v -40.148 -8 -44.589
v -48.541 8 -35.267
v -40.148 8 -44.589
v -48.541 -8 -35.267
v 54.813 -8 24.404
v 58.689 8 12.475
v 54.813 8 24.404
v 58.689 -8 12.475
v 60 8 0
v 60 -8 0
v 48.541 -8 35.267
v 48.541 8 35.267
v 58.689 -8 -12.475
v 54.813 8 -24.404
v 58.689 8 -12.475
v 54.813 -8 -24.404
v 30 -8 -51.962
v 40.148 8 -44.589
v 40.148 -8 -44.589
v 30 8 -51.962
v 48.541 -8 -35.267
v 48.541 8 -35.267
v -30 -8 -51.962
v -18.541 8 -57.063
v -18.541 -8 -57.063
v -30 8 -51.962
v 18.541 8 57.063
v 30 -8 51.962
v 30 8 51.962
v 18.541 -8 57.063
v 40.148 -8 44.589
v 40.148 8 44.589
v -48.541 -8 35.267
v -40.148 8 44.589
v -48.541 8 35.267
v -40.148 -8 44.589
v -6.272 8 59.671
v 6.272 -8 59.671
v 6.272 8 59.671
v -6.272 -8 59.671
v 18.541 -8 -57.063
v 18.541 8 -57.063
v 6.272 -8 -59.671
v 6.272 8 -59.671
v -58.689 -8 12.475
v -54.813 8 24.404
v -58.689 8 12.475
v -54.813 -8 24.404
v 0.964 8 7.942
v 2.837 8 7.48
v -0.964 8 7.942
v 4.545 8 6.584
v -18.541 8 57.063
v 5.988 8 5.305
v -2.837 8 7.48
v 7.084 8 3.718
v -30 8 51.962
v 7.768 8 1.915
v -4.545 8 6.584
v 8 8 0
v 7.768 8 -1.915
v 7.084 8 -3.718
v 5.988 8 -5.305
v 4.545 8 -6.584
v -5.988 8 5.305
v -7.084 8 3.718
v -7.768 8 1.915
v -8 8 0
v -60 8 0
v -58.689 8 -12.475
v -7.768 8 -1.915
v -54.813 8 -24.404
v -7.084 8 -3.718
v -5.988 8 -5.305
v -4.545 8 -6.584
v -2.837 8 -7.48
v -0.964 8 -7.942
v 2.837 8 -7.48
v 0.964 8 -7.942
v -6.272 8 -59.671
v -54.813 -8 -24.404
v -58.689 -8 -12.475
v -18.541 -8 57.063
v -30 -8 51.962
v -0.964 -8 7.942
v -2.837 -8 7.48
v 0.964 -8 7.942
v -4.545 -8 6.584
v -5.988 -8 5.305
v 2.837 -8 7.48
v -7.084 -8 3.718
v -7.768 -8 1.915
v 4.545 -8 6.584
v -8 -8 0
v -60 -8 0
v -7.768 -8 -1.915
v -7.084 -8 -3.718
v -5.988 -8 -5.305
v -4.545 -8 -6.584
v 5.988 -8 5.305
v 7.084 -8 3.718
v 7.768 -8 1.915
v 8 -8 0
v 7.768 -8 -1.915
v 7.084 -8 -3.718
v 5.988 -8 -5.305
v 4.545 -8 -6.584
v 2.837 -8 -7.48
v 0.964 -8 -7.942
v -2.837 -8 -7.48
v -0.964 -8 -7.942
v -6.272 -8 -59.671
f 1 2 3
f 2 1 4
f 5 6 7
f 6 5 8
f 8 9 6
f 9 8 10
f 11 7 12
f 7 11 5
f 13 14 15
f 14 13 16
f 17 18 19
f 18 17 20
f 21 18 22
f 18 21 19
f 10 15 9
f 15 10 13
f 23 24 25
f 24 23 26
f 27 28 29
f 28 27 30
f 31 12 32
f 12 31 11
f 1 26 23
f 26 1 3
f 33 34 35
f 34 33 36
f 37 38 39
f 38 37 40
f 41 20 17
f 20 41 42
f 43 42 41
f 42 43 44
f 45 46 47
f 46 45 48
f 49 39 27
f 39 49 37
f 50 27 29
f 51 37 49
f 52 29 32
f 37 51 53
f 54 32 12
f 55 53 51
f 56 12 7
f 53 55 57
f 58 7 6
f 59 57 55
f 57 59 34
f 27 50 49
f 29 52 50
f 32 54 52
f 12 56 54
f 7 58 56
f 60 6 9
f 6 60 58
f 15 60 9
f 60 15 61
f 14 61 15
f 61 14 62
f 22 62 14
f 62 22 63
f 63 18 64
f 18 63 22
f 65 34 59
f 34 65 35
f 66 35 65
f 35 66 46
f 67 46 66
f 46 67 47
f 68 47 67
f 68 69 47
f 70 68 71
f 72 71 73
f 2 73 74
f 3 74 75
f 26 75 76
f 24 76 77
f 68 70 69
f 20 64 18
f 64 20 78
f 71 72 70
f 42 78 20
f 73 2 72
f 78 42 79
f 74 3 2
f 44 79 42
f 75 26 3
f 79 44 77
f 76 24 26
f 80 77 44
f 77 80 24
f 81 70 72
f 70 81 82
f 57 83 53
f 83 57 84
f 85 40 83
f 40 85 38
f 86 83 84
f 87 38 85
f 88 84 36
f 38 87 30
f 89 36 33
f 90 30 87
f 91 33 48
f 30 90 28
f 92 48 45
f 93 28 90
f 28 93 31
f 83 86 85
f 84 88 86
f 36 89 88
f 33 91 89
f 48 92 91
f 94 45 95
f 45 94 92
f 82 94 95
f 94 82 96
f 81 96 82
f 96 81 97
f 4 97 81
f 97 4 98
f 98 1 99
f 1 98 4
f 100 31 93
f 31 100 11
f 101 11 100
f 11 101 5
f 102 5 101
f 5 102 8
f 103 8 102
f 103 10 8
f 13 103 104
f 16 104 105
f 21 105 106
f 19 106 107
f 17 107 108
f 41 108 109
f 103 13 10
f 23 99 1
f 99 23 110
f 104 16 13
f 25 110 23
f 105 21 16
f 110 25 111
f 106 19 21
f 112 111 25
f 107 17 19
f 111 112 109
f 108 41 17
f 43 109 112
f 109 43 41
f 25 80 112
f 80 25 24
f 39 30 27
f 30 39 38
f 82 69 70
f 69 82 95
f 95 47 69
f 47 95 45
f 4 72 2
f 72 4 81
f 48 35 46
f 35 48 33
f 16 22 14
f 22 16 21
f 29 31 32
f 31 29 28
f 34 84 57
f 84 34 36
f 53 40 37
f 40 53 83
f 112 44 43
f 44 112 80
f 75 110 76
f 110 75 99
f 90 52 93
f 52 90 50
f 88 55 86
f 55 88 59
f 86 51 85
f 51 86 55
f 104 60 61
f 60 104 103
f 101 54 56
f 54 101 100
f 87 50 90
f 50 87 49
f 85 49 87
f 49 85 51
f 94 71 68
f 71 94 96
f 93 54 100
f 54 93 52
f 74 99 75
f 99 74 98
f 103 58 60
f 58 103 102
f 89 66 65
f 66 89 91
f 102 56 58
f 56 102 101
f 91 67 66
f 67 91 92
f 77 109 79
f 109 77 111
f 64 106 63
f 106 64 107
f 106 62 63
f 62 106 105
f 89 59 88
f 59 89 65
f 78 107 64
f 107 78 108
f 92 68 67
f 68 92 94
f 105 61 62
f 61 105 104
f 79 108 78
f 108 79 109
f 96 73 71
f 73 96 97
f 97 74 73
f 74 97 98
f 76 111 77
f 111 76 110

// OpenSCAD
// file: ../fixings/tube_clamp_square_base_plate_132_functions.scad
function get_L_shaft_with_base_plate_square_base_plate_132(beam_width) = 
    // (beam_width == 40) ?
    75
;
function get_R_plate_square_base_plate_132(beam_width) = 
    // (beam_width == 40) ?
    [143, 75, 18.5]
;
function get_thickness_square_base_plate_132(beam_width) = 
    // (beam_width == 40) ?
    8
;
function get_offset_hole_x_square_base_plate_132(beam_width) = 
    // (beam_width == 40) ?
    100 / 2
;
function get_diameter_hole_square_base_plate_132(beam_width) = 
    // (beam_width == 40) ?
    10
;
// file: ../fixings/tube_clamp_round_base_plate_132_functions.scad
function get_L_shaft_with_base_plate_round_base_plate_132(tube_diameter) = 
    (tube_diameter == 27) ? 
        85
    : (tube_diameter == 42) ?
        122
    : 25
;
function get_R_plate_round_base_plate_132(tube_diameter) = 
    (tube_diameter == 27) ? 
        [64, 114, 7]
    : (tube_diameter == 42) ?
        [80, 140, 10]
    : [10, 20, 1]
;
function get_offset_hole_y_round_base_plate_132(tube_diameter) = 
    (tube_diameter == 27) ? 
        38
    : (tube_diameter == 42) ?
        50
    : 10
;
function get_diameter_hole_round_base_plate_132(tube_diameter) = 10;
// file: ../fixings/tube_clamp_round_3_way_through_116_functions.scad
function  get_L_shaft_long_round_3_way_through_116(tube_diameter) = 
    (tube_diameter == 27) ? 
        42
    : (tube_diameter == 42) ?
        60
    : 25
;
function get_thickness_round_3_way_through_116(tube_diameter) = 7;
function get_L_shaft_short_round_3_way_through_116(tube_diameter) = tube_diameter + 2 * get_thickness_round_3_way_through_116();
// file: ../fixings/tube_clamp_round_tee_long_104_functions.scad
// include <../../config.scad>;

function get_L_shaft_long_round_tee_long_104(tube_diameter) = 
    (tube_diameter == 27) ? 
        85
    : (tube_diameter == 42) ?
        122
    : 25
;
function get_L_shaft_short_round_tee_long_104(tube_diameter) = 
    (tube_diameter == 27) ? 
        42
    : (tube_diameter == 42) ?
        61
    : 10
;
// file: brake_assembly_functions.scad
// include <../../config.scad>; // circular reference!

function get_y_pos_lead_fixing_ballscrew_to_brake_arms(angle_brake_rod, y_pos_axle_rear, x_pos_axle_leg_rear, x_offset_fixing_brake_arm_to_lead_plate) = y_pos_axle_rear + (x_pos_axle_leg_rear - x_offset_fixing_brake_arm_to_lead_plate) / tan(angle_brake_rod); // (X_POS_AXLE_LEG_REAR - X_OFFSET_FIXING_BRAKE_ARM_TO_LEAD_PLATE)
// file: ../common/washer.scad
include <../../config.scad>;

module washer(t, d_outer, d_inner, centre = true) {
    r_outer = d_outer / 2;
    r_inner = d_inner / 2;
    color("silver") difference() {
        cylinder(t, r_outer, r_outer, center = centre);
        cylinder(t, r_inner, r_inner, center = centre);
    }
    // Shopping
    echo(str("Washer: Washer Φ", d_outer, "mm x ", d_inner, "mm x ", t, "mm - x1"));
}

// $fn = 200;
washer(3, 10, 40);
// file: ../common/metric_bolt_functions.scad
function get_metric_bolt_head_height(size) = size;
function get_metric_bolt_head_diameter(size) = size * 2;
function get_metric_bolt_washer_diameter_safe_working_clearance(size) = 
    (size < 20) ?
        4 * size
    :
        3 * size
;
// file: ../common/metric_nut.scad
// include <../../config.scad>;
use <./beam_hexagonal.scad>;
use <./metric_bolt_functions.scad>;

module metric_nut(size, centre = true) {
    height = get_metric_bolt_head_height(size);
    diameter = get_metric_bolt_head_diameter(size);
    radius = diameter / 2;
    color("gray") difference() {
        // body
        beam_hexagonal(height, diameter, centre = centre, suppress_shopping_outputs = true);
        // hole
        cylinder(height, size / 2, size / 2, center = centre);
    }
    // Shopping
    echo(str("Nut: Nut M", size, " - x1"));
}

// $fn = 200;
metric_nut(12);
// file: ../common/beam_hexagonal.scad
// include <../../config.scad>;

module beam_hexagonal(L, d, centre = true, suppress_shopping_outputs = false) {
    radius = d / 2;
    linear_extrude(L, center = centre) polygon([[radius, 0], [radius * cos(60), radius * sin(60)], [radius * cos(120), radius * sin(120)], [radius * cos(180), radius * sin(180)], [radius * cos(240), radius * sin(240)], [radius * cos(300), radius * sin(300)]]);
    // Shopping
    if (!suppress_shopping_outputs) {
        echo(str("Hexagonal beam: Hexagonal beam Φ", d, "mm x ", L, "mm - x1"));
    }
}

// $fn = 200;
beam_hexagonal(500, 50);
// main file
include <../../config.scad>;
use <../common/beam_hexagonal.scad>
use <../common/metric_nut.scad>;
use <../common/metric_bolt_functions.scad>;
use <../common/washer.scad>


module power_wheel_assembly() {
    echo("Power wheel assembly:");
    d_nut = get_metric_bolt_head_diameter(D_BRAKE_BALLSCREW_AXLE);
    h_nut = get_metric_bolt_head_height(D_BRAKE_BALLSCREW_AXLE);
    union() {
        // power wheel
        rotate([90, 0, 0]) {
            color(COLOUR_FILAMENT_3D_PRINTER) difference() {
                // body
                cylinder(T_BRAKE_BALLSCREW_POWER_WHEEL, D_BRAKE_BALLSCREW_POWER_WHEEL / 2, D_BRAKE_BALLSCREW_POWER_WHEEL / 2, center = true);
                // nut slot
                beam_hexagonal(h_nut, d_nut, centre = true, suppress_shopping_outputs = true); // cylinder(T_BRAKE_BALLSCREW_POWER_WHEEL, d_nut / 2, d_nut / 2, center = true);
            }
            // ballscrew bearing (nut)
            /*
            color("gray") difference() {
                // body
                cylinder(T_BRAKE_BALLSCREW_POWER_WHEEL, d_nut / 2, d_nut / 2, center = true);
                // hole
                cylinder(T_BRAKE_BALLSCREW_POWER_WHEEL, D_BRAKE_BALLSCREW_AXLE / 2, D_BRAKE_BALLSCREW_AXLE / 2, center = true);
            }
            */
            metric_nut(D_BRAKE_BALLSCREW_AXLE);
        }
    }
    // Shopping
    echo("Power wheel: 3D printed component - x1");
    // Power wheel bearing (nut)
}

power_wheel_assembly();
